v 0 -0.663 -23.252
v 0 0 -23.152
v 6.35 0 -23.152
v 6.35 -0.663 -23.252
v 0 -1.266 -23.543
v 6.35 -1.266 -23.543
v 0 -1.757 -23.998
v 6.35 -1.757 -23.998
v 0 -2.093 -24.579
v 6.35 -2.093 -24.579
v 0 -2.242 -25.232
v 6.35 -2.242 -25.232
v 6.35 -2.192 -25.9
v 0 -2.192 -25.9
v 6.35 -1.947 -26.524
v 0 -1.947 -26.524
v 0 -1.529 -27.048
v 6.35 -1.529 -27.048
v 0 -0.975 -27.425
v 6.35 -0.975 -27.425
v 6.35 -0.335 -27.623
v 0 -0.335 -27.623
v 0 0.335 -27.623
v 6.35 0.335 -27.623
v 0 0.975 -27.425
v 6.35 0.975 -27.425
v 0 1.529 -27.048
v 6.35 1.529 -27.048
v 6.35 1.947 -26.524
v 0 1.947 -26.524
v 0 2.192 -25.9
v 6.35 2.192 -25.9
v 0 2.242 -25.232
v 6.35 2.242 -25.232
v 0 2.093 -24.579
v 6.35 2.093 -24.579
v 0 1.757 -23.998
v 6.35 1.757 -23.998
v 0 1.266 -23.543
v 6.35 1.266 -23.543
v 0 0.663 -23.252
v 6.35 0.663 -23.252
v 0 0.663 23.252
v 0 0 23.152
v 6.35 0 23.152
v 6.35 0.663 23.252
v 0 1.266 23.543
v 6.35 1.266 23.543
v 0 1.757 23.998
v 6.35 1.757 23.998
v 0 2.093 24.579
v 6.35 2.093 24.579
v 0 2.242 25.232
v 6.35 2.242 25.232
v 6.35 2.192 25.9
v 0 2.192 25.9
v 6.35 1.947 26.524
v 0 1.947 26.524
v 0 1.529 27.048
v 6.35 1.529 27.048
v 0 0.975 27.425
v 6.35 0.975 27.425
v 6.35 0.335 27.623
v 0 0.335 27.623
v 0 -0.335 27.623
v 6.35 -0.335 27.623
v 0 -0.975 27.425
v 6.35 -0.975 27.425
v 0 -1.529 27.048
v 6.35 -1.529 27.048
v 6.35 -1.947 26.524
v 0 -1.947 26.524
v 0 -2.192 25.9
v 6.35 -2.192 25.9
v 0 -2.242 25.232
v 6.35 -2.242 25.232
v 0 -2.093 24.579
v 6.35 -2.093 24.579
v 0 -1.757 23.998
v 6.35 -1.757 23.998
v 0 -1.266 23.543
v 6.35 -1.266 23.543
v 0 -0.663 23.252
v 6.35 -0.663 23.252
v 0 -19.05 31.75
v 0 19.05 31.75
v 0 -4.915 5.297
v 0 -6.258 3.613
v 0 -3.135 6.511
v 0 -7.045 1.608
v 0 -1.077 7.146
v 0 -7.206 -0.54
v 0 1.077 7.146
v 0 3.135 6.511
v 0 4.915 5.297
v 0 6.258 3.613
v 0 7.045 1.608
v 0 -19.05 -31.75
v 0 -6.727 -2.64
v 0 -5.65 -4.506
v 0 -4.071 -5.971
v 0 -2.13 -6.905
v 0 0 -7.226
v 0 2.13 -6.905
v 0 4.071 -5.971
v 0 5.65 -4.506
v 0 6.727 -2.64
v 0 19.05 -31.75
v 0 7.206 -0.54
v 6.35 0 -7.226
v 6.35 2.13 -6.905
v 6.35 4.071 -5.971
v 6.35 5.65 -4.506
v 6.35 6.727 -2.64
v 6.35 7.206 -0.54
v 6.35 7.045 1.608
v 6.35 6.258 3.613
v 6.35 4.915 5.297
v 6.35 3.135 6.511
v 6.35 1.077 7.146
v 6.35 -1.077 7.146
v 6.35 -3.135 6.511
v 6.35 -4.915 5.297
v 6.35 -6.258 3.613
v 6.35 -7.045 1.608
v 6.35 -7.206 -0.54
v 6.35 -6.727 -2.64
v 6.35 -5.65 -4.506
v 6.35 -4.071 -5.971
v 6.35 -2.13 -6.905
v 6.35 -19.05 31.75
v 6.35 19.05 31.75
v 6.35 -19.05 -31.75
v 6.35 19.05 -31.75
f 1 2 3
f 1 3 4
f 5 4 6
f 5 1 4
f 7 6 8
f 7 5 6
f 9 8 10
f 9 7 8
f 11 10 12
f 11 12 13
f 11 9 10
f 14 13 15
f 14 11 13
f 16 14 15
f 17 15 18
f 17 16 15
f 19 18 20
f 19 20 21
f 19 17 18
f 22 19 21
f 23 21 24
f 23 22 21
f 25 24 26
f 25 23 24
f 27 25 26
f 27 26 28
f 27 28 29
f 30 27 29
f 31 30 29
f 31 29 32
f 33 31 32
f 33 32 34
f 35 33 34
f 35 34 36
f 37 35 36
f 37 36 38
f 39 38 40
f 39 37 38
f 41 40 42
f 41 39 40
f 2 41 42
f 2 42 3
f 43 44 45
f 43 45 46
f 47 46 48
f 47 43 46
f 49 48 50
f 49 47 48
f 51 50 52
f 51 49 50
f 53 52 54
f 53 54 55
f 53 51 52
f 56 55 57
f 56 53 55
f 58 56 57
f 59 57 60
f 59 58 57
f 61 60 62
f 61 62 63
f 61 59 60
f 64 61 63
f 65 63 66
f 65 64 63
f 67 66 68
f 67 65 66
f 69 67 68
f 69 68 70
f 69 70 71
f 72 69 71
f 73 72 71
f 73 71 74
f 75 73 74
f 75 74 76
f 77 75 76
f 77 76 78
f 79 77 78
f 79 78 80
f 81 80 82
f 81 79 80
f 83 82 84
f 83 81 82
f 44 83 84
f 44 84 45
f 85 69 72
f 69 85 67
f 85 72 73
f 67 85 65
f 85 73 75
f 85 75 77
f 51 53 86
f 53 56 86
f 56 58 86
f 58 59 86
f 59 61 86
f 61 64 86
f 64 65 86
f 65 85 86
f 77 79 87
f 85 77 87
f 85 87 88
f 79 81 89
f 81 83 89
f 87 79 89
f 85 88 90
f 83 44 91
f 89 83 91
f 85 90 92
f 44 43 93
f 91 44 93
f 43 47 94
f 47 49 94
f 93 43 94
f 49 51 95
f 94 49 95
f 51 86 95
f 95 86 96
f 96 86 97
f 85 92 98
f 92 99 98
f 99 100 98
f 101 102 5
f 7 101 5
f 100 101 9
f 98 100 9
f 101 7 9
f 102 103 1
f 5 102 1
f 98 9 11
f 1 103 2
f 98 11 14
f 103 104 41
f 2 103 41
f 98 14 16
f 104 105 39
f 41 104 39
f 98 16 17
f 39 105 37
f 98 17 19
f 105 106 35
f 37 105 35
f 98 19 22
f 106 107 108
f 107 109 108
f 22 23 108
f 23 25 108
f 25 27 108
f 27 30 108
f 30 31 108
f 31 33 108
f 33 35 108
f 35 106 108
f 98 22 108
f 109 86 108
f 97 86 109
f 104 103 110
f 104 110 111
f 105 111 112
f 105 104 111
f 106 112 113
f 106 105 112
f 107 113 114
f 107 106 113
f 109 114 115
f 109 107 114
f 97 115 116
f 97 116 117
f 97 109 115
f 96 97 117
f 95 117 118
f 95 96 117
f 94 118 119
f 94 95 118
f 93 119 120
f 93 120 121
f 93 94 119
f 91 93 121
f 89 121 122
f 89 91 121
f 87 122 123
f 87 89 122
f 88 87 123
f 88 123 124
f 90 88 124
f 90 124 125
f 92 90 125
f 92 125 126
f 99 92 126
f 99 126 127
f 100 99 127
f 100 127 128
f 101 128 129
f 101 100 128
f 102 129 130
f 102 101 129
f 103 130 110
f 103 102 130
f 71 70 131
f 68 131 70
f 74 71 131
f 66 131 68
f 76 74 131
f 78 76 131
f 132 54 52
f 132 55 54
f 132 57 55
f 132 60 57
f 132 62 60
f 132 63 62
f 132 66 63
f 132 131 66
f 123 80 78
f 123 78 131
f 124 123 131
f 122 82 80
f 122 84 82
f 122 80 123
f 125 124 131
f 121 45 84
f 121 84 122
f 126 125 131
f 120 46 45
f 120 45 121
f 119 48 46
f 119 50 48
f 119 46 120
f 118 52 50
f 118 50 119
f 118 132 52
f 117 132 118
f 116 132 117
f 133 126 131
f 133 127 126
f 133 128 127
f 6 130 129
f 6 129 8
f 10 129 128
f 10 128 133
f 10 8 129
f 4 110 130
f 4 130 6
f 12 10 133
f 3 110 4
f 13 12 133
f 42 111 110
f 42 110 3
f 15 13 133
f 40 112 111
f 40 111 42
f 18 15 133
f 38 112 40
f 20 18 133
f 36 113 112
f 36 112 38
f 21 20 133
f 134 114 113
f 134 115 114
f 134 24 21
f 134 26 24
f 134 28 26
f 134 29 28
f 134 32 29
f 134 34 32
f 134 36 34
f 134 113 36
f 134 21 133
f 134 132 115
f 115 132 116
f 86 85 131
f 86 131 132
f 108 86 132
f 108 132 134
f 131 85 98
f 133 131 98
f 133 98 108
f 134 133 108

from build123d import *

# Parameters (mm, degrees)
SKETCH1_W           = 63.5
SKETCH1_H           = 38.1
SKETCH1_R           = 7.2263
SKETCH1_R_2         = 2.2479
BOSS_EXTRUDE1_DEPTH = 6.35


with BuildPart() as part:
    # Sketch1 → Boss-Extrude1 (new body)
    with BuildSketch(Plane(origin=(0, 0, 0), x_dir=(0, 0, -1), z_dir=(1, 0, 0))):
        Rectangle(SKETCH1_W, SKETCH1_H)
        Circle(SKETCH1_R, mode=Mode.SUBTRACT)
        with Locations((-25.4, 0)):
            Circle(SKETCH1_R_2, mode=Mode.SUBTRACT)
        with Locations(Location((25.4, 0, 0), (0, 0, 180))):
            Circle(SKETCH1_R_2, mode=Mode.SUBTRACT)
    extrude(amount=BOSS_EXTRUDE1_DEPTH)


solid = part.part
